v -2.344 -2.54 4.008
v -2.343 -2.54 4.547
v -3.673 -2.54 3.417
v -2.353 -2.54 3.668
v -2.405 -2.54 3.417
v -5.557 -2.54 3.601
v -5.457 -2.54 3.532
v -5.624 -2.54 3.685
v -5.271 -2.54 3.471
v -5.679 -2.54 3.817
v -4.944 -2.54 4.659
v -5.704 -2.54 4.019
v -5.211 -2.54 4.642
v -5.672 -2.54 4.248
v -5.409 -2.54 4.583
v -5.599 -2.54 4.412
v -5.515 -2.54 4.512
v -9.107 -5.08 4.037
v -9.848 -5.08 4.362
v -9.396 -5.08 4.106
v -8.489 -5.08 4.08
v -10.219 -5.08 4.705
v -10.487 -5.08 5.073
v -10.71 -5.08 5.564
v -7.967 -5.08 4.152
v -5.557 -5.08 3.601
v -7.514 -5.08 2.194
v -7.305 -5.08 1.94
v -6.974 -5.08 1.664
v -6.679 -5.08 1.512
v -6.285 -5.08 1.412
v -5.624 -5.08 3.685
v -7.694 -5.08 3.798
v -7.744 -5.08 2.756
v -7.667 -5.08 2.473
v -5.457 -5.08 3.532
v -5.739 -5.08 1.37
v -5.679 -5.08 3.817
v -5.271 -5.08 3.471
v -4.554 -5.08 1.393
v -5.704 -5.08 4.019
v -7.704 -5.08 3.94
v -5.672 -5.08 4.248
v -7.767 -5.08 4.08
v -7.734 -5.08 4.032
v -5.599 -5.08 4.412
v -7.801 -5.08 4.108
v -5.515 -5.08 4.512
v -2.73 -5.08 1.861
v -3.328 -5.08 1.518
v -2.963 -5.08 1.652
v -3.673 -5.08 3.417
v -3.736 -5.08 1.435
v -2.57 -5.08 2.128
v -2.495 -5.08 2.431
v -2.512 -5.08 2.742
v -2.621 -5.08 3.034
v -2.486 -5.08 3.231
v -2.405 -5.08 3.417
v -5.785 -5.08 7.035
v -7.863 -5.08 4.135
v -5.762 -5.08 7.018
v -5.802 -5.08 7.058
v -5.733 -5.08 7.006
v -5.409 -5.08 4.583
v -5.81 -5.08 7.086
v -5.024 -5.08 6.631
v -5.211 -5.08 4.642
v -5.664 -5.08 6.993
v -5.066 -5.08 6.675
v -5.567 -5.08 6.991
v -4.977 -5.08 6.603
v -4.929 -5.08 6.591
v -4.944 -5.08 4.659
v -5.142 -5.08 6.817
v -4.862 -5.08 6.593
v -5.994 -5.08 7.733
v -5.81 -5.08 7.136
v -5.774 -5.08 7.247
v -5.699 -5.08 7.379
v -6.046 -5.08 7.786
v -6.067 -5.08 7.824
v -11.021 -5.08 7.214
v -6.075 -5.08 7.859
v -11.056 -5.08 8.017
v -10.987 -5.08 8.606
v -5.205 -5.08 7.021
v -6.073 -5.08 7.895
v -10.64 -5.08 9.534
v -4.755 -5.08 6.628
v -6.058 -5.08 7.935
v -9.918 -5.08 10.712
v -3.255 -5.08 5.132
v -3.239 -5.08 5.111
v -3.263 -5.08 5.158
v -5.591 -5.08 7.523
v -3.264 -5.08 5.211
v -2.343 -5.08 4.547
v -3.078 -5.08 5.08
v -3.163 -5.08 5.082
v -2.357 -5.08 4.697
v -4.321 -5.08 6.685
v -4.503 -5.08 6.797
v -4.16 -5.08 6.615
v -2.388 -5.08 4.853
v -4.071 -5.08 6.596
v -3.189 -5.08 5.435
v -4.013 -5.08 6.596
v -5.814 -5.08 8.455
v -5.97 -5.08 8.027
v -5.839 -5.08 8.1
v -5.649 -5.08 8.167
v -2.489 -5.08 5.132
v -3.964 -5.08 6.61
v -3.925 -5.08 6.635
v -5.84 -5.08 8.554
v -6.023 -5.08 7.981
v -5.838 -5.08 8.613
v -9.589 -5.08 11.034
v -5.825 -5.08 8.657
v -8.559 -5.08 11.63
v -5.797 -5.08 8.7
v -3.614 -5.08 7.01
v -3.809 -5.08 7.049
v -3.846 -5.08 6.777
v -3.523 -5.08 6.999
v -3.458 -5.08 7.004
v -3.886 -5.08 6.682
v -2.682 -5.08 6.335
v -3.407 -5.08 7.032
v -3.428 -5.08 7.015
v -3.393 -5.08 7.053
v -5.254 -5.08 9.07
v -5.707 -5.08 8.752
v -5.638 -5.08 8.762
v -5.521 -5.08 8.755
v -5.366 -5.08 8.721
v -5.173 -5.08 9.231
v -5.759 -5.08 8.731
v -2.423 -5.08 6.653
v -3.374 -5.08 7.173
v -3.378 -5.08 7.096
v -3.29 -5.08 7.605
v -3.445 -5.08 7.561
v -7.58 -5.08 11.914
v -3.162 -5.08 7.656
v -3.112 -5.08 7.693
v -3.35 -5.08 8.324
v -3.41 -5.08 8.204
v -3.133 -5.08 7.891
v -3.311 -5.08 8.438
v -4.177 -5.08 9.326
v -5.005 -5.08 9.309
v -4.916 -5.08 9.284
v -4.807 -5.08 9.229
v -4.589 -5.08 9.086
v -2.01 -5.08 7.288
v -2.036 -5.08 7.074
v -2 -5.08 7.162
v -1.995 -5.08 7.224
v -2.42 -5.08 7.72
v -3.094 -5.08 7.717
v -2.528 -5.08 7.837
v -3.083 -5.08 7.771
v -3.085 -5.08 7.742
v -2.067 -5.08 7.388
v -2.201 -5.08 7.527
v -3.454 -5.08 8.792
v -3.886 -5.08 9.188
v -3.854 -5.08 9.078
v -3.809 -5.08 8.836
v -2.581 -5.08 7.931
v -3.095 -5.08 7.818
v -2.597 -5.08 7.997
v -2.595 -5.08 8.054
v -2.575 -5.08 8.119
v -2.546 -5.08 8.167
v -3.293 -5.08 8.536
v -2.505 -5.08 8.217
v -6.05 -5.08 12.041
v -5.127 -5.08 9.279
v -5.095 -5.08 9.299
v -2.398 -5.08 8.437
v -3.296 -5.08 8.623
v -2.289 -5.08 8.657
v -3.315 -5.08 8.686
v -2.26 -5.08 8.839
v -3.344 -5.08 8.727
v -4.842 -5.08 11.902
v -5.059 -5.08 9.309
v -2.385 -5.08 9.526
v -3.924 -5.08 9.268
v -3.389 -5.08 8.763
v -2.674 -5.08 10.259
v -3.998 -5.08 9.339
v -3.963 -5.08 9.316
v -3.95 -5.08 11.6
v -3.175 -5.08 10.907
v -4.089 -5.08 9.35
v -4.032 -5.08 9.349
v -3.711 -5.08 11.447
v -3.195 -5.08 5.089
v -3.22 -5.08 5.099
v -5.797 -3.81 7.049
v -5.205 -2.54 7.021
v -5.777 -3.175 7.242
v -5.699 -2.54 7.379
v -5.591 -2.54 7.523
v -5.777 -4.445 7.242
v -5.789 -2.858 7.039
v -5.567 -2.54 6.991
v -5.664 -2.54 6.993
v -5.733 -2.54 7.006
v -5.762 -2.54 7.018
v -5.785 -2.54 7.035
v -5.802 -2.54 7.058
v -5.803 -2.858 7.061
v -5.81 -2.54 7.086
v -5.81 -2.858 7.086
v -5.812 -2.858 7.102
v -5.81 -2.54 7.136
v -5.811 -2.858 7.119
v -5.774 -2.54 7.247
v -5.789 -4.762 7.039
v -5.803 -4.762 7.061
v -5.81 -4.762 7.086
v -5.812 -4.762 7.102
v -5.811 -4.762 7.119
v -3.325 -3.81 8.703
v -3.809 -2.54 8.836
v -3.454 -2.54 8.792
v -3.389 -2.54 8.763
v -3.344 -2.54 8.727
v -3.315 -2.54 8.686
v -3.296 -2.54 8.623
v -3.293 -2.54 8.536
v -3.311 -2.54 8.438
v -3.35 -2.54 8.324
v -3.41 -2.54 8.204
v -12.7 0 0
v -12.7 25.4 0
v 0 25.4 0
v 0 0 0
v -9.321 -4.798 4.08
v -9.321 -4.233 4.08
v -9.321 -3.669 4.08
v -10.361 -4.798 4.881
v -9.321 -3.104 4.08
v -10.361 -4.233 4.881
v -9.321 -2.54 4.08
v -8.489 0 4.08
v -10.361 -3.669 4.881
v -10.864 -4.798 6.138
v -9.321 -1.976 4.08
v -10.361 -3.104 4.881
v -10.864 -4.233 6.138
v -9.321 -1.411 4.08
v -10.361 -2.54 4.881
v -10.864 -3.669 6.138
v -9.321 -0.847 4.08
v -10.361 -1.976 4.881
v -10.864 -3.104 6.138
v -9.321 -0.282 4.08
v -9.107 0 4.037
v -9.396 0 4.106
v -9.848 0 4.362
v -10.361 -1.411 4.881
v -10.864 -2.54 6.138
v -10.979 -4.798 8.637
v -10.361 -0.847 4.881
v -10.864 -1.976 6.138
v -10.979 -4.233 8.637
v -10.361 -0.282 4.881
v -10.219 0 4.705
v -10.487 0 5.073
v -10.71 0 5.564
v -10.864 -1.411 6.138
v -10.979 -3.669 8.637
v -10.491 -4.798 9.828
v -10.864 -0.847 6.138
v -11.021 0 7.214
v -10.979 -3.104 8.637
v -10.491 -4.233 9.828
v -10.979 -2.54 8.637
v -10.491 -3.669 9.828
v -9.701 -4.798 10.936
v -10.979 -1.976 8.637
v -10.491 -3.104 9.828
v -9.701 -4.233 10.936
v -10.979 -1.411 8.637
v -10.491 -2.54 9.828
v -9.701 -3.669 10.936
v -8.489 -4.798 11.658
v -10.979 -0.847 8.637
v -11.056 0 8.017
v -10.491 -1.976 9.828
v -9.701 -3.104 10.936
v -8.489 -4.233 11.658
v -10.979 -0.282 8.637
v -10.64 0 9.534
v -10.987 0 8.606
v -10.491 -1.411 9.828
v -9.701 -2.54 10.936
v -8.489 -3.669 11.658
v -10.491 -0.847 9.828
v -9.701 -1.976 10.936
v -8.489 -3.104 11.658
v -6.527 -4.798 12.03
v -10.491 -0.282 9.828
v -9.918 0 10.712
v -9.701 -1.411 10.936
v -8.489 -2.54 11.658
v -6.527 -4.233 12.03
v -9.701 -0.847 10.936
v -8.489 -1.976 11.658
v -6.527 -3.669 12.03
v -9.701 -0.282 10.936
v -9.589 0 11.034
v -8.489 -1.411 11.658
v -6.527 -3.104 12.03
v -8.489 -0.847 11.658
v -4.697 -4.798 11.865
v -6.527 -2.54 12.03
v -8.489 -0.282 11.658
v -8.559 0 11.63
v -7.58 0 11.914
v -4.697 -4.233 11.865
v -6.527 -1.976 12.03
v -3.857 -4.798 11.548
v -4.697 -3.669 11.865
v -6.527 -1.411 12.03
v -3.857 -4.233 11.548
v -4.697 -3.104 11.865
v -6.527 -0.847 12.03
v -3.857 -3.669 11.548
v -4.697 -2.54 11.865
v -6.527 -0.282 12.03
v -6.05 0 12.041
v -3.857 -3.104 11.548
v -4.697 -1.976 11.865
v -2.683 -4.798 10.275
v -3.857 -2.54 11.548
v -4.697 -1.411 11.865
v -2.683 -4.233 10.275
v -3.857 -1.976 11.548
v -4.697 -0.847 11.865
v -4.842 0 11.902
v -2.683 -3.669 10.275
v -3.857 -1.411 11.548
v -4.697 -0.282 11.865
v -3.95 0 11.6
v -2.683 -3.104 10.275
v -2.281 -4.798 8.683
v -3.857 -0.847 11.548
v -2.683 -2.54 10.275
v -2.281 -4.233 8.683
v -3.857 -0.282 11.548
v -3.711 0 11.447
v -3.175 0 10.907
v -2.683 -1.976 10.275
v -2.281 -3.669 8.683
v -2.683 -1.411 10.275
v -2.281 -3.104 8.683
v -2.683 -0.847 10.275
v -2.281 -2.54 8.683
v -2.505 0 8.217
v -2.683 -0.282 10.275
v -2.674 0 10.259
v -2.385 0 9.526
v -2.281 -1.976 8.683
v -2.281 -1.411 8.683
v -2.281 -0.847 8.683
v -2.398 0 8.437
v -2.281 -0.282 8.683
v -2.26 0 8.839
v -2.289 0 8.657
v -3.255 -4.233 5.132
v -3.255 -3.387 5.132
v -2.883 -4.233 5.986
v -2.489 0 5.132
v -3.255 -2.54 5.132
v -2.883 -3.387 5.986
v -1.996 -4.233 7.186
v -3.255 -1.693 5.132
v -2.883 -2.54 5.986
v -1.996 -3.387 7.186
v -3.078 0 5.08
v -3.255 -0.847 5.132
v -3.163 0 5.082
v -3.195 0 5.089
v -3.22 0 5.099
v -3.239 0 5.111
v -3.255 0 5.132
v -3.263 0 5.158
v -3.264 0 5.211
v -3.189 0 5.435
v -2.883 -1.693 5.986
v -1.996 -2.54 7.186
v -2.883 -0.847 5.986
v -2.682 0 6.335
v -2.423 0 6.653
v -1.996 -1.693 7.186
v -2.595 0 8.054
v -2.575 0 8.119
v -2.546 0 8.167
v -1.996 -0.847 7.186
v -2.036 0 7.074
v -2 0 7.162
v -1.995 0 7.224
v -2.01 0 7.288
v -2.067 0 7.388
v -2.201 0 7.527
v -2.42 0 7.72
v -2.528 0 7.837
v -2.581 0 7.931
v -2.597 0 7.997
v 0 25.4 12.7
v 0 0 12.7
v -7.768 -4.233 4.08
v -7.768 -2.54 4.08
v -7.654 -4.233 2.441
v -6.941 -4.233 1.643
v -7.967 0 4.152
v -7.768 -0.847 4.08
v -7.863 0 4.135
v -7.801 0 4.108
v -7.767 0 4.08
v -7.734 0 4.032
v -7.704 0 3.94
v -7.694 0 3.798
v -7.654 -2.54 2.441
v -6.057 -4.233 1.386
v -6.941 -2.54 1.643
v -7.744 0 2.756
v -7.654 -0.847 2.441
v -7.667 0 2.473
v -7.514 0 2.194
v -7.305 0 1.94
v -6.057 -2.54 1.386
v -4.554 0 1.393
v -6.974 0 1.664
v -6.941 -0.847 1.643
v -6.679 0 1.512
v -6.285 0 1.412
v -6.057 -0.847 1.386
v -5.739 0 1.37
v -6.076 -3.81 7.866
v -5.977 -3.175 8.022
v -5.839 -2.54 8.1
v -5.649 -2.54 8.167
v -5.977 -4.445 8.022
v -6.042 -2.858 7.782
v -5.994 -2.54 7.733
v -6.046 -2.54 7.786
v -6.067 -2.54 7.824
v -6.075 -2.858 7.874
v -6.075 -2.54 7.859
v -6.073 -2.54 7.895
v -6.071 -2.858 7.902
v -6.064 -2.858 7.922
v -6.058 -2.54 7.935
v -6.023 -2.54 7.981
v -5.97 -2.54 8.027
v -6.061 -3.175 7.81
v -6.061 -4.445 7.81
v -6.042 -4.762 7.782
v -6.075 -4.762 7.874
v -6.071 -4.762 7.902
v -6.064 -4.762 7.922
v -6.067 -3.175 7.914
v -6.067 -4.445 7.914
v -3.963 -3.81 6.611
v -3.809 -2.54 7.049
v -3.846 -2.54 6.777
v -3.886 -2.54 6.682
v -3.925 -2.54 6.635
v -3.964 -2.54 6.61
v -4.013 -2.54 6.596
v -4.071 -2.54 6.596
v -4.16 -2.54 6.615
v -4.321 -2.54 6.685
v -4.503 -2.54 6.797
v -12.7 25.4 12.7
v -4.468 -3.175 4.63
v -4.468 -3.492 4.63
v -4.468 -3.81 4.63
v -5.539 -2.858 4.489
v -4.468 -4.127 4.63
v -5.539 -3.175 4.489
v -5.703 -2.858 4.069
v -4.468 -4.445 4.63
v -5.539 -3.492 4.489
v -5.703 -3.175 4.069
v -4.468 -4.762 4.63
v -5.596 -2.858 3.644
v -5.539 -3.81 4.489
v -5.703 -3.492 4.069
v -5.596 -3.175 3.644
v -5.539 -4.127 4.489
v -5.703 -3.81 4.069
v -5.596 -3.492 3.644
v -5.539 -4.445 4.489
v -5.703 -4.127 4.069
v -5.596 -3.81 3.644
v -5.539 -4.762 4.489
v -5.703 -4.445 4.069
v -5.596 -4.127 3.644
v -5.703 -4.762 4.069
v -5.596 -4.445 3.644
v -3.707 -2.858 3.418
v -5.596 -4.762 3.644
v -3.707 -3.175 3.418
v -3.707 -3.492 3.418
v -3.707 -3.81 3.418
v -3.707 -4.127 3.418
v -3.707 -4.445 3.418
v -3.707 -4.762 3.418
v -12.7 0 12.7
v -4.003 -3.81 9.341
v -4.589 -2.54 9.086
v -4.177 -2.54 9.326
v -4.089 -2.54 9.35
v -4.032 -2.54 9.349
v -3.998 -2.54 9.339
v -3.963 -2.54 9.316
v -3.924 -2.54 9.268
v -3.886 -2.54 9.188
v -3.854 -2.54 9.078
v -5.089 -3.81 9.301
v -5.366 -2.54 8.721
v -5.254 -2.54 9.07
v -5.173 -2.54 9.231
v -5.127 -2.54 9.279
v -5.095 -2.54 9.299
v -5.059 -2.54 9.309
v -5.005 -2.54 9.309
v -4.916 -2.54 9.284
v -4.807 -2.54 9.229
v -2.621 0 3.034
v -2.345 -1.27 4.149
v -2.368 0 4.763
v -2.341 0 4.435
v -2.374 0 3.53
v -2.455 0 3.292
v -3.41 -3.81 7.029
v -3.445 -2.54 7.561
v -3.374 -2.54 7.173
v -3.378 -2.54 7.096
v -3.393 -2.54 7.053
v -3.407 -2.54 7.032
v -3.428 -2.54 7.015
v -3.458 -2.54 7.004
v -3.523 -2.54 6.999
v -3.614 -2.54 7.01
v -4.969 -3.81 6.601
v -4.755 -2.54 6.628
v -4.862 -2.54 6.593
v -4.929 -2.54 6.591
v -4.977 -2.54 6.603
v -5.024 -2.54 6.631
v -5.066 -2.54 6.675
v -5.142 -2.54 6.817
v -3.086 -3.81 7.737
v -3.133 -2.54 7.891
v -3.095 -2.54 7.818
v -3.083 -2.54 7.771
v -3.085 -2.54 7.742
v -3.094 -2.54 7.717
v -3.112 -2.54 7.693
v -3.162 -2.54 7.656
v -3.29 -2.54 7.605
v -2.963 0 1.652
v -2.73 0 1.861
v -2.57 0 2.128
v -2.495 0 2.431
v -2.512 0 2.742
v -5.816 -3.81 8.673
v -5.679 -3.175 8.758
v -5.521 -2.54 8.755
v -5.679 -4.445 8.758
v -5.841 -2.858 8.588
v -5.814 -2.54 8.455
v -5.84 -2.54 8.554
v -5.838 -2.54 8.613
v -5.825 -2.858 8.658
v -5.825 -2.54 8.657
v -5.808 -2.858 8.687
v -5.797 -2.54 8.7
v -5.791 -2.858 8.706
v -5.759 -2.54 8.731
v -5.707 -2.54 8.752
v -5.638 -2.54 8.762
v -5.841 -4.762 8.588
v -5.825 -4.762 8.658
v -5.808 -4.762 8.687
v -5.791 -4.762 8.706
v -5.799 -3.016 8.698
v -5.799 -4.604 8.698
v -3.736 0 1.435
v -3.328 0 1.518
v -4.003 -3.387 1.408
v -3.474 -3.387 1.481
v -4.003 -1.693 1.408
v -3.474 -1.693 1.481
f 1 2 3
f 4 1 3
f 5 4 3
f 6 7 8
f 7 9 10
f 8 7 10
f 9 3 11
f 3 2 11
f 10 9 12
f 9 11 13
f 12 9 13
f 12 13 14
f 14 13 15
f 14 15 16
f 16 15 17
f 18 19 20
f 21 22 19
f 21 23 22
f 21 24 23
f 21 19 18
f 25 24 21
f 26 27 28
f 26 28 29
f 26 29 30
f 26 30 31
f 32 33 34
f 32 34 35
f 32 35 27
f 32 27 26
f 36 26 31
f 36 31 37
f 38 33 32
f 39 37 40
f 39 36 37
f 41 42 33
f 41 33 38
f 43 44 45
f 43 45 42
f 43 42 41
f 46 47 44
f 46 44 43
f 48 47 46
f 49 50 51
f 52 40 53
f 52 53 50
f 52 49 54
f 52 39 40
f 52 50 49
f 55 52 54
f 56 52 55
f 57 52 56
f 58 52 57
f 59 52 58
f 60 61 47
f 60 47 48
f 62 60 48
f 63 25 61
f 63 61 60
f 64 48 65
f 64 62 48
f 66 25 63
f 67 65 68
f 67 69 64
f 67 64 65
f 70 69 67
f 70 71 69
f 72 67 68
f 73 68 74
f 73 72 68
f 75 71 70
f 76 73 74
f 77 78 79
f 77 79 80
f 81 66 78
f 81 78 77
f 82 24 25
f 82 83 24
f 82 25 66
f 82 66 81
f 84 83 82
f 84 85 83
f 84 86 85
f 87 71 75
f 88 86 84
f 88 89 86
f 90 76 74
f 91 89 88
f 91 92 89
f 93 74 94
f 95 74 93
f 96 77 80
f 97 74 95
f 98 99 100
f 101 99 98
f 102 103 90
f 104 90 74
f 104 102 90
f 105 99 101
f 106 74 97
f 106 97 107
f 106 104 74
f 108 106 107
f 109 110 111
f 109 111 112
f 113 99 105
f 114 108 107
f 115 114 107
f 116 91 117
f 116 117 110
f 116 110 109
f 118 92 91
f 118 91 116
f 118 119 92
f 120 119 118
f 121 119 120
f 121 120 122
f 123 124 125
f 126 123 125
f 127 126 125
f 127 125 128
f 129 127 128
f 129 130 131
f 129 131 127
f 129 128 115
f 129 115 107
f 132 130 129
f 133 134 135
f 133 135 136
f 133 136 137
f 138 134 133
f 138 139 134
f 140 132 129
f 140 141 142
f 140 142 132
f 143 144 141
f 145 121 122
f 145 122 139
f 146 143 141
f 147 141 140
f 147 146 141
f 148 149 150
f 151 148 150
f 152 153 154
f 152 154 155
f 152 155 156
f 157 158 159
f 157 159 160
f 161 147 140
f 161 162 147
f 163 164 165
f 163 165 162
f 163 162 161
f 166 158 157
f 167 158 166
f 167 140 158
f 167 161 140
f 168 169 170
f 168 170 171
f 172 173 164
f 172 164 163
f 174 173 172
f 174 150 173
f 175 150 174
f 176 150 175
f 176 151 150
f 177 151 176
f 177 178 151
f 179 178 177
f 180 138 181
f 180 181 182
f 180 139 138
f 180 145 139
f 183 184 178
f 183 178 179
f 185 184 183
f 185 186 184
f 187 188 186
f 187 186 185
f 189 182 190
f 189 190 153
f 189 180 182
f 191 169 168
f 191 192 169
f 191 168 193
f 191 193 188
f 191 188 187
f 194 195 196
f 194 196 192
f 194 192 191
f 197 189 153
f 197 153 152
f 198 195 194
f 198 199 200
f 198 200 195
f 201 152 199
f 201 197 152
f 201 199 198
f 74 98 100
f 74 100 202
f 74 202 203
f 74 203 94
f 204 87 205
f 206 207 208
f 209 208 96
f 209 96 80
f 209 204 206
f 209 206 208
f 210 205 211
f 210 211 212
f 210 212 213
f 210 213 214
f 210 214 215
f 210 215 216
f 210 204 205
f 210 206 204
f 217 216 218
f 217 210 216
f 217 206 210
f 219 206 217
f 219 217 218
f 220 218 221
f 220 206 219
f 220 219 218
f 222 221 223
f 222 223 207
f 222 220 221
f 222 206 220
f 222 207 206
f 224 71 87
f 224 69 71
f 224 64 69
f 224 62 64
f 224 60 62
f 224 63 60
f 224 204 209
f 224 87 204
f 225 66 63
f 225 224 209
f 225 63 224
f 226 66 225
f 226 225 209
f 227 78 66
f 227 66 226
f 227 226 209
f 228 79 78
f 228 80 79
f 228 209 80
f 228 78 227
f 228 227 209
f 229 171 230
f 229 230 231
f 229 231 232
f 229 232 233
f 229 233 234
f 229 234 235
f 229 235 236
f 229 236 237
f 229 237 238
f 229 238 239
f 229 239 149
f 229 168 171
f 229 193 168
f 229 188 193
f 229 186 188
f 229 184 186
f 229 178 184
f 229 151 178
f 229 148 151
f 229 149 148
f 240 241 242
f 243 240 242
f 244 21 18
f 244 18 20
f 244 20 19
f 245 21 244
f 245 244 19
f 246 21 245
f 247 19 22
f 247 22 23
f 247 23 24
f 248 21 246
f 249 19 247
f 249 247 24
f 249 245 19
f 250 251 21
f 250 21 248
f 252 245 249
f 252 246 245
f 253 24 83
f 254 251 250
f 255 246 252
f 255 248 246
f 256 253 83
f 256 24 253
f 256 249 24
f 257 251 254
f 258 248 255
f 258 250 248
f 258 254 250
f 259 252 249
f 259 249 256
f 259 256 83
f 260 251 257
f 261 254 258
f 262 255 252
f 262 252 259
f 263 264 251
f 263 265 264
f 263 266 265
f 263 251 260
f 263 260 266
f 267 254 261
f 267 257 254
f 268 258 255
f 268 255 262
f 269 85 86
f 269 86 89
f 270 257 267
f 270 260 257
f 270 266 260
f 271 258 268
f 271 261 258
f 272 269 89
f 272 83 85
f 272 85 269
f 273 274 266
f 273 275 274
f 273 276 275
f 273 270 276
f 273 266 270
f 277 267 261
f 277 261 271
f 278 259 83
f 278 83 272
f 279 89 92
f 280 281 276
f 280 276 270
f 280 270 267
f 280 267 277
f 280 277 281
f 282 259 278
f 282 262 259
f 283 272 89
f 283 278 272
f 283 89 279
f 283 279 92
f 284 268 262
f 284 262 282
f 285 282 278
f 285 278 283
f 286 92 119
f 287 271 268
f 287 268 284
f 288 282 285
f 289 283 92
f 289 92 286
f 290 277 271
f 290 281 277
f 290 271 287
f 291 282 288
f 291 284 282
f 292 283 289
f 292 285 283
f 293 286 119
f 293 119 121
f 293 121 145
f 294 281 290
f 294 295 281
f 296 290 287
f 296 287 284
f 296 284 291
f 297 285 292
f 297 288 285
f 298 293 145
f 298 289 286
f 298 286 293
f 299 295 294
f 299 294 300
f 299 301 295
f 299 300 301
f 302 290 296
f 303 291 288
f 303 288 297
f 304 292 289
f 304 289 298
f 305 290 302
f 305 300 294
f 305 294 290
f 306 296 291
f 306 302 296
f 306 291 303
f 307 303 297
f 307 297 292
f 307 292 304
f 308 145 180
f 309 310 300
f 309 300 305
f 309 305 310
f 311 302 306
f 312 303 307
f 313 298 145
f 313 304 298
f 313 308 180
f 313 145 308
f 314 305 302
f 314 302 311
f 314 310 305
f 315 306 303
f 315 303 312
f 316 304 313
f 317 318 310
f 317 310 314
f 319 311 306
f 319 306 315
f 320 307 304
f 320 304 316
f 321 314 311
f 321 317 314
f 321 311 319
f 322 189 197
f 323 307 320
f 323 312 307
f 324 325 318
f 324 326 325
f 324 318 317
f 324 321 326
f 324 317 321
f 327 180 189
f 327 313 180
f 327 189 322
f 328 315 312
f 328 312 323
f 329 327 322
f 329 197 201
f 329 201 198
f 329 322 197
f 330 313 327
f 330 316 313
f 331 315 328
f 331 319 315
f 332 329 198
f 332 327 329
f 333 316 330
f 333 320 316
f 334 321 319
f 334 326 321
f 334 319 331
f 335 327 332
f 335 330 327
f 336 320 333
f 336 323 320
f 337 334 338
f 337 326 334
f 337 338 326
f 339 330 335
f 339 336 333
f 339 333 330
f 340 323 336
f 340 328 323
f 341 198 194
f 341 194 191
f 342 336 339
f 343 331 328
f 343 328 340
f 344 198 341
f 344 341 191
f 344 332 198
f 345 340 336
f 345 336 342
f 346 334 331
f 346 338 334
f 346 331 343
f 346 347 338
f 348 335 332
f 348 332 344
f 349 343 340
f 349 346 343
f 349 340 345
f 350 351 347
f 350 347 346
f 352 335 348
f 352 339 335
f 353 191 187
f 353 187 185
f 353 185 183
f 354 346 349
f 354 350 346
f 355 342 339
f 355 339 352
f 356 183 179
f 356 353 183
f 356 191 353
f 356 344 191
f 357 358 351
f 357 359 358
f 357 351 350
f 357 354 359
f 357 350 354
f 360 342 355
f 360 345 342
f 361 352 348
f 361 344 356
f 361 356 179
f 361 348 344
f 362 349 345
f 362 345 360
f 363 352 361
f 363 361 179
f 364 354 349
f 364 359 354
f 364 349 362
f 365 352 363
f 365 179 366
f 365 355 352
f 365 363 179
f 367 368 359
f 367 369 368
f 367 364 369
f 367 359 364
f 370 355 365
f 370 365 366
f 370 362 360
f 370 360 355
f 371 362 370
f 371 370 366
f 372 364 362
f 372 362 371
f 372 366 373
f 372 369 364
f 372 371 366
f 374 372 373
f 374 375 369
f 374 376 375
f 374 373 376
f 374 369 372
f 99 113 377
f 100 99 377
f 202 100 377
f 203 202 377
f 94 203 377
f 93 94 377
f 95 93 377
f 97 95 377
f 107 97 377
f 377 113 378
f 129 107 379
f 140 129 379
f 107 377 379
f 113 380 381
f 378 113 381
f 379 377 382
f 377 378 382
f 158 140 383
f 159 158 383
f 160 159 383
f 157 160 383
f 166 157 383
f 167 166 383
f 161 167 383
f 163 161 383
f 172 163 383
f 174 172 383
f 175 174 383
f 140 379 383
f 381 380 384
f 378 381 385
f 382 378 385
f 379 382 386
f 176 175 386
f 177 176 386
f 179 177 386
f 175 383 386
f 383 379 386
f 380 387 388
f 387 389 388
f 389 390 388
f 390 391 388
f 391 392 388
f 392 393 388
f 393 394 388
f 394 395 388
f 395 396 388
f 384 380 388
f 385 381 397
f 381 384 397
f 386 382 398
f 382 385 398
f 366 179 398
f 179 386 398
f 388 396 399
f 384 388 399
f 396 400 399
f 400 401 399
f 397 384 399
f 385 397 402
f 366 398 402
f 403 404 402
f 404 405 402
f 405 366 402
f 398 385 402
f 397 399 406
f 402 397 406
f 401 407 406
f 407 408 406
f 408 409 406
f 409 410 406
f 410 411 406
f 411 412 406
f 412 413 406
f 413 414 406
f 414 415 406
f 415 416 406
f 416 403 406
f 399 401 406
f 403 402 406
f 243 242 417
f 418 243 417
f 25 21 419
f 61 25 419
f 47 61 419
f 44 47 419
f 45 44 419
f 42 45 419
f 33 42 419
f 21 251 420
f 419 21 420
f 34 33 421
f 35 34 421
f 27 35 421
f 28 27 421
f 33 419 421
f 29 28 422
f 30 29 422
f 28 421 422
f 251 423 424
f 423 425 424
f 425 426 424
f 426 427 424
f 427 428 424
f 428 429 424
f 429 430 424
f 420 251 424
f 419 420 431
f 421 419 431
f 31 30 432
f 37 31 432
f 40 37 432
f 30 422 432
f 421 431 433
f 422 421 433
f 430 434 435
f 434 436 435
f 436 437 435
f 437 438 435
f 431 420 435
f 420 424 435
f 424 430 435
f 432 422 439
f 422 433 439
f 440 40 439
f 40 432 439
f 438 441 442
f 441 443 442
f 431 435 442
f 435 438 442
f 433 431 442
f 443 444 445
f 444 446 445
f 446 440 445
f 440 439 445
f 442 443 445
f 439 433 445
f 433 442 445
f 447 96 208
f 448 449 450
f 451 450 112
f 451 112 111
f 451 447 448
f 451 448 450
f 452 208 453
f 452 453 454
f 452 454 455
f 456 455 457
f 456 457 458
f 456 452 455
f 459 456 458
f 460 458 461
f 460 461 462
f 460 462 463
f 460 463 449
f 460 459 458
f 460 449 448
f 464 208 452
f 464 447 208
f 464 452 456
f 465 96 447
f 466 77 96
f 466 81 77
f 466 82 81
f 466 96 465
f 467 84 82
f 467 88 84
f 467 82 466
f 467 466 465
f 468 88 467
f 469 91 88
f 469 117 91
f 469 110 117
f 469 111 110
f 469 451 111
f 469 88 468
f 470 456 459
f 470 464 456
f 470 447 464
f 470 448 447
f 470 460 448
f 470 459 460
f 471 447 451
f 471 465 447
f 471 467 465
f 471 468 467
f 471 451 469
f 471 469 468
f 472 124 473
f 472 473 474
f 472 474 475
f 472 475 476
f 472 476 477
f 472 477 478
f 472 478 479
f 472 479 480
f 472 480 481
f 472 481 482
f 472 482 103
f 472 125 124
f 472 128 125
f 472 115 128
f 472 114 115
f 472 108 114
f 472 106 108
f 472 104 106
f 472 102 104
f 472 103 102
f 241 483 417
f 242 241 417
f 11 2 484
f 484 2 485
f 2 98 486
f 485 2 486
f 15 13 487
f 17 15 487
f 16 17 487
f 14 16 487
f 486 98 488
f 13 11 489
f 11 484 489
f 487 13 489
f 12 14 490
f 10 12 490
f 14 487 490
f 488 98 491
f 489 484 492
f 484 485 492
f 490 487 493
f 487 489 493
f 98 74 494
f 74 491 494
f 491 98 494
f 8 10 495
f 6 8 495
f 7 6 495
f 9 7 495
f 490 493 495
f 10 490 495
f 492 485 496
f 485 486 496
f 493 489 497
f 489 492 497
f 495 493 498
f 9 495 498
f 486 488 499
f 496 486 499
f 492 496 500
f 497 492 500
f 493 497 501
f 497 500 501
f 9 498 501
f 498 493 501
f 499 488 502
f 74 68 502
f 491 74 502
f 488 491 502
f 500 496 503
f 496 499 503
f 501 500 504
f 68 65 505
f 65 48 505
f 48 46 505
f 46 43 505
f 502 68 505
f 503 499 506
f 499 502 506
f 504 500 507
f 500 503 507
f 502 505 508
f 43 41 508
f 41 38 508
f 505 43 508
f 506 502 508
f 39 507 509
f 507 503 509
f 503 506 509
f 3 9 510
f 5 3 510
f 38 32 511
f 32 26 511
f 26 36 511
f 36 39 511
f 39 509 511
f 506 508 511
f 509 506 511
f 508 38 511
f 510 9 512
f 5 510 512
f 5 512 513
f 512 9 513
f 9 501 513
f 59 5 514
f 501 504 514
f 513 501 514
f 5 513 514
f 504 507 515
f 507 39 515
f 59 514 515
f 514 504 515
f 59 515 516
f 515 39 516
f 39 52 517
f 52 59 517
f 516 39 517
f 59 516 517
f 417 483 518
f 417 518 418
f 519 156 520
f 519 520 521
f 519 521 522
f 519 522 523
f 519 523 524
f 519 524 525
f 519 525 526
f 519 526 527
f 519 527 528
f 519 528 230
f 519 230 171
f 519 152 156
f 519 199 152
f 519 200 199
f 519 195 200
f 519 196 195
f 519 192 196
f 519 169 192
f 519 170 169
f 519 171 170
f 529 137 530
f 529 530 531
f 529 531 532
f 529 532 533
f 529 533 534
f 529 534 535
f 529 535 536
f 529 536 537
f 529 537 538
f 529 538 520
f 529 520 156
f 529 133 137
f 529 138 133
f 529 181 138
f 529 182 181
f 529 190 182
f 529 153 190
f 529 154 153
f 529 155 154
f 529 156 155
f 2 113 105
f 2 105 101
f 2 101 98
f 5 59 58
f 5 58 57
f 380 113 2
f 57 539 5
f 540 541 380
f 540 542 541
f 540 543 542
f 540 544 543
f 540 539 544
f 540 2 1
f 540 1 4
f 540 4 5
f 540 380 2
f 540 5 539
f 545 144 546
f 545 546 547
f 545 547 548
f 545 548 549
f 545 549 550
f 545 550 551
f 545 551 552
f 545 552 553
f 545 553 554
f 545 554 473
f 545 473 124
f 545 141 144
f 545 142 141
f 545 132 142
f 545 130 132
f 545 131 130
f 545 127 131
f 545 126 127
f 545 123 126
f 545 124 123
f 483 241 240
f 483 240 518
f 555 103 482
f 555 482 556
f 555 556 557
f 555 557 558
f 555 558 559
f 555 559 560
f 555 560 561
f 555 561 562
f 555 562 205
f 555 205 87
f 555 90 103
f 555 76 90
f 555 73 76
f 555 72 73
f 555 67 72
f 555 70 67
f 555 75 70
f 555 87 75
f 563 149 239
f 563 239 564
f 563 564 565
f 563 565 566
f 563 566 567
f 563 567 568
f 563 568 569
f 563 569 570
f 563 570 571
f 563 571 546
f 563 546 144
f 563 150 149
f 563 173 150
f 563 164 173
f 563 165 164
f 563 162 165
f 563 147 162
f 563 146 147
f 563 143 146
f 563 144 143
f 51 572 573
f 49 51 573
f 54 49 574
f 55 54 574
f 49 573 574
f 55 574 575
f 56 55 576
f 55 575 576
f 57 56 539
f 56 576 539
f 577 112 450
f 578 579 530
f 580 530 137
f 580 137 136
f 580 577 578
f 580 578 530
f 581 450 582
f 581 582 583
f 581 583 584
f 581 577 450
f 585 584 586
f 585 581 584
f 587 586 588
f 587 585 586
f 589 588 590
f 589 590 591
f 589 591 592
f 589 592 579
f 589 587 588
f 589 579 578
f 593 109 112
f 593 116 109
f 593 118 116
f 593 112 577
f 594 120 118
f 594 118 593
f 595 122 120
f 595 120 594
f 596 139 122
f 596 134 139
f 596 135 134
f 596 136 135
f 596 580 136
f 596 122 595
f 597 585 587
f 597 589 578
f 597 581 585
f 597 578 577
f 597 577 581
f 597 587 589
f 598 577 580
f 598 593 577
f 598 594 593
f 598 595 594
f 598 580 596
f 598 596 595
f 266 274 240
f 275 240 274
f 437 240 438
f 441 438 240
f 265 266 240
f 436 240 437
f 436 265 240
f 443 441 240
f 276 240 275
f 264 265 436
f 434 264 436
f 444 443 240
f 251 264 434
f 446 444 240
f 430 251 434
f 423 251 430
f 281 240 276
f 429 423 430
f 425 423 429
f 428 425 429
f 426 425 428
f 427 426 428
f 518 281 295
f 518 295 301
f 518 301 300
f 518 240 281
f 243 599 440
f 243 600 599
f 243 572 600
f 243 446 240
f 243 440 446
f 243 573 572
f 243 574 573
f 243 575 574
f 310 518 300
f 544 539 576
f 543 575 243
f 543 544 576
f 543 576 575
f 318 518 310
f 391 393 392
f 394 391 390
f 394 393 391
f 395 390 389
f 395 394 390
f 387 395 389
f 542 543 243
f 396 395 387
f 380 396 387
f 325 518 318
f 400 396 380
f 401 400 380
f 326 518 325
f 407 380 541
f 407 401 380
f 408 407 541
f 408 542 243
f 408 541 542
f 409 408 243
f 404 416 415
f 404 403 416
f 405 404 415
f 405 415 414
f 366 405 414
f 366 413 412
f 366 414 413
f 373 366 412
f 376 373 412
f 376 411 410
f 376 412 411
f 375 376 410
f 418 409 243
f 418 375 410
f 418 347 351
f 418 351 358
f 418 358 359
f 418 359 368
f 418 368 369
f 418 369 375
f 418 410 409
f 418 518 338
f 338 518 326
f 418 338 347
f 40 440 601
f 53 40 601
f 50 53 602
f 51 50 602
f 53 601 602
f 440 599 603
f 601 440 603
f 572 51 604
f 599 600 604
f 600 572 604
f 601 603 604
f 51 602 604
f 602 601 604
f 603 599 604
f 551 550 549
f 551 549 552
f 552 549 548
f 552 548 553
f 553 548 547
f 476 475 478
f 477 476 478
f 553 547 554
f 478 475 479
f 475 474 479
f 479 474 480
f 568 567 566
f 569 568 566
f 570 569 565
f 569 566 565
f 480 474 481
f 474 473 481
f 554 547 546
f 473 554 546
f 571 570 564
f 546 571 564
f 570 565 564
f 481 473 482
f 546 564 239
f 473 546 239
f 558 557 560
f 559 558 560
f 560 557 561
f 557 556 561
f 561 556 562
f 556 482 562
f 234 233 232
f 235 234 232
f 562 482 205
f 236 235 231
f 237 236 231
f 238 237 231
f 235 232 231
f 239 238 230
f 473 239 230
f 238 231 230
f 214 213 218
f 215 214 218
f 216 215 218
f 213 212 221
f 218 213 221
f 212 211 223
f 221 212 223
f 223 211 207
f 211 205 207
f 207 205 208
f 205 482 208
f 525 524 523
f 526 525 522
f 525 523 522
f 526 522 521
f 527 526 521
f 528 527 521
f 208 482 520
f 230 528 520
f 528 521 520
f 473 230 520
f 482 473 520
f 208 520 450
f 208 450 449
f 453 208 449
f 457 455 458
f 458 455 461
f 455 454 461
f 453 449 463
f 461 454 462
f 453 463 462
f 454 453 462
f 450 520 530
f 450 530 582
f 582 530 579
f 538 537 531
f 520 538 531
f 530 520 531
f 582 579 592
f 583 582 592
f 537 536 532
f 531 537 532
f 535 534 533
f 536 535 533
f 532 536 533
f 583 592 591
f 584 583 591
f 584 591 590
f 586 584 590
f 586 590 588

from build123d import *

# Parameters (mm, degrees)
F2_DEPTH = 5.08
F4_DEPTH = 2.54
F1_W     = 12.7
F1_H     = 12.7
F5_DEPTH = 25.4


with BuildPart() as f2:
    # F0 (on Front) → F2 (new body)
    with BuildSketch(Plane.XZ):
        with BuildLine():
            add(Edge.make_bspline(
                [(-4.5544075169, 1.3928102558), (-3.9892874978, 1.3936850005), (-3.4668862346, 1.4183520112), (-2.9626822173, 1.6524156046)],
                knots=[0, 0, 0, 0, 1.6127567598, 1.6127567598, 1.6127567598, 1.6127567598], degree=3))
            ThreePointArc((-2.9626822173, 1.6524156046), (-2.5207832675, 2.2763871387), (-2.6206157382, 3.0344429644))
            add(Edge.make_bspline(
                [(-2.4891644716, 5.1324297674), (-2.3917935509, 4.9163684072), (-2.3253208599, 4.6052474923), (-2.353390935, 4.1438424987), (-2.3281786078, 3.742489633), (-2.3932487238, 3.3100298606), (-2.6206157382, 3.0344429644)],
                knots=[0, 0, 0, 0, 0.2589698298, 0.4843279934, 0.6967977434, 1, 1, 1, 1], degree=3))
            add(Edge.make_bspline(
                [(-2.4891644716, 5.1324297674), (-2.8544493428, 5.1336356945), (-3.5672375297, 4.8785009618), (-2.8152049208, 6.0650838014), (-2.5884297024, 6.5663222822), (-1.7654979463, 7.1854603195), (-2.3447073669, 7.6364237388), (-2.7154974719, 7.9931282788), (-2.5049047545, 8.2173803821)],
                knots=[0, 0, 0, 0, 0.1716411, 0.3609103093, 0.5270907012, 0.6999372879, 0.8498725142, 1, 1, 1, 1], degree=3))
            add(Edge.make_bspline(
                [(-8.4889251739, 4.0800906718), (-8.7589659452, 4.0356777743), (-9.3664055338, 3.9357737781), (-10.5025798395, 4.8392058498), (-10.9059573733, 6.1149046303), (-11.0740084695, 7.5770614576), (-11.0572913783, 8.6481895291), (-10.5066556684, 9.8561725352), (-9.801754858, 11.0173560965), (-8.5112279732, 11.7040800215), (-7.5130409963, 11.949362548), (-6.5368197907, 12.0472622026), (-5.4793488606, 12.0464613388), (-4.709549558, 11.8804829441), (-3.8077392578, 11.6081842347), (-3.2731241454, 11.0134554774), (-2.6219451437, 10.30229784), (-2.3610549942, 9.4868714168), (-2.171059183, 8.6611482213), (-2.4550122068, 8.385969167), (-2.5049047545, 8.2173803821)],
                knots=[0, 0, 0, 0, 0.0500780332, 0.1130041956, 0.1768956978, 0.2430992912, 0.299601719, 0.3619066714, 0.4259636055, 0.4912026128, 0.546777757, 0.6011196121, 0.6571512931, 0.7063637819, 0.7583810191, 0.807340639, 0.8606442381, 0.9121796378, 0.9605447696, 1, 1, 1, 1], degree=3))
            add(Edge.make_bspline(
                [(-8.4889251739, 4.0800906718), (-8.1891140401, 4.1435086925), (-7.5824093701, 4.2718428501), (-7.7738611768, 3.2641836277), (-7.7788952185, 2.4127249564), (-6.96730618, 1.53934763), (-6.0435092719, 1.3353211789), (-5.0895326997, 1.3721509203), (-4.5544075169, 1.3928102558)],
                knots=[0, 0, 0, 0, 0.1444018704, 0.2922149289, 0.4524717395, 0.6284063598, 0.7915576541, 1, 1, 1, 1], degree=3))
        make_face()
    extrude(amount=F2_DEPTH)

    # F3 (on face) → F4 (cut)
    with BuildSketch(Plane.XZ.offset(5.08)):
        with BuildLine():
            add(Edge.make_bspline(
                [(-5.3659848497, 8.7208530881), (-5.2846155708, 8.9727846377), (-5.1710596458, 9.5011555318), (-4.7726393834, 9.210328647), (-4.5891036161, 9.0864328929)],
                knots=[0, 0, 0, 0, 0.5208455257, 1, 1, 1, 1], degree=3))
            add(Edge.make_bspline(
                [(-5.6486829395, 8.1671502605), (-5.8447078545, 8.4470894225), (-5.89391753, 8.7083353104), (-5.6496376746, 8.8005099615), (-5.3659848497, 8.7208530881)],
                knots=[0, 0, 0, 0, 0.5203515764, 1, 1, 1, 1], degree=3))
            add(Edge.make_bspline(
                [(-5.5914319294, 7.523380365), (-5.9265031703, 7.6624876681), (-6.211049844, 7.8478040514), (-5.9524201806, 8.0796377028), (-5.6486829395, 8.1671502605)],
                knots=[0, 0, 0, 0, 0.5158761073, 1, 1, 1, 1], degree=3))
            add(Edge.make_bspline(
                [(-5.205368324, 7.020722894), (-5.515797094, 6.9918642839), (-5.9481758185, 6.9293833828), (-5.7582442305, 7.3223857959), (-5.5914319294, 7.523380365)],
                knots=[0, 0, 0, 0, 0.5169308821, 1, 1, 1, 1], degree=3))
            add(Edge.make_bspline(
                [(-4.503384329, 6.7972433223), (-4.6912512029, 6.6368405751), (-5.0149208939, 6.4855239947), (-5.1457634756, 6.7906186317), (-5.205368324, 7.020722894)],
                knots=[0, 0, 0, 0, 0.5060867221, 1, 1, 1, 1], degree=3))
            add(Edge.make_bspline(
                [(-3.8085296017, 7.0489807986), (-3.8179540305, 6.8205589246), (-3.9035421605, 6.4800894964), (-4.2735109706, 6.6416122857), (-4.503384329, 6.7972433223)],
                knots=[0, 0, 0, 0, 0.4741735792, 1, 1, 1, 1], degree=3))
            add(Edge.make_bspline(
                [(-3.4450484308, 7.5613067453), (-3.3931593436, 7.3388874407), (-3.2822488519, 6.9007696507), (-3.643370237, 7.0191586974), (-3.8085296017, 7.0489807986)],
                knots=[0, 0, 0, 0, 0.5361984101, 1, 1, 1, 1], degree=3))
            add(Edge.make_bspline(
                [(-3.4099325727, 8.2039631478), (-3.2352017889, 8.026130414), (-2.9070428182, 7.6933064131), (-3.2817976238, 7.6055767004), (-3.4450484308, 7.5613067453)],
                knots=[0, 0, 0, 0, 0.544051219, 1, 1, 1, 1], degree=3))
            add(Edge.make_bspline(
                [(-3.8085296017, 8.8362629435), (-3.5648082767, 8.8254965564), (-3.2197177366, 8.7894369685), (-3.2957520719, 8.4058710656), (-3.4099325727, 8.2039631478)],
                knots=[0, 0, 0, 0, 0.498752658, 1, 1, 1, 1], degree=3))
            add(Edge.make_bspline(
                [(-4.5891036161, 9.0864328929), (-4.3604972194, 9.2348500345), (-3.9239269227, 9.5411548249), (-3.8456756119, 9.0618850519), (-3.8085296017, 8.8362629435)],
                knots=[0, 0, 0, 0, 0.5208679793, 1, 1, 1, 1], degree=3))
        make_face()
        with BuildLine():
            add(Edge.make_bspline(
                [(-2.3434008563, 4.5467756363), (-2.3371047246, 4.4107865736), (-2.3527985145, 4.134411807), (-2.3331786748, 3.8220852684), (-2.3628702318, 3.5440811456), (-2.4050047171, 3.4165451502)],
                knots=[0.2763820067, 0.2763820067, 0.2763820067, 0.2763820067, 0.4843279934, 0.6967977434, 0.8530401243, 0.8530401243, 0.8530401243, 0.8530401243], degree=3))
            add(Edge.make_bspline(
                [(-2.3434008563, 4.5467756363), (-2.5799295982, 4.5740173506), (-3.306592605, 4.6187595682), (-4.4065439596, 4.5927229699), (-5.7091448571, 4.7733705585), (-5.7837350784, 3.4109409569), (-4.6706431829, 3.462309837), (-3.7363509645, 3.4226981298), (-2.9067433155, 3.3728872928), (-2.551855723, 3.4093395126), (-2.4050047171, 3.4165451502)],
                knots=[0, 0, 0, 0, 0.1262990683, 0.2716966967, 0.4089490542, 0.5305134586, 0.6554946789, 0.788539933, 0.9079641556, 1, 1, 1, 1], degree=3))
        make_face()
    extrude(amount=-F4_DEPTH, mode=Mode.SUBTRACT)

    # F1 (on Front) → F5 (join)
    with BuildSketch(Plane.XZ):
        with Locations((-6.35, 6.35)):
            Rectangle(F1_W, F1_H)
    extrude(amount=-F5_DEPTH)


solid = f2.part
